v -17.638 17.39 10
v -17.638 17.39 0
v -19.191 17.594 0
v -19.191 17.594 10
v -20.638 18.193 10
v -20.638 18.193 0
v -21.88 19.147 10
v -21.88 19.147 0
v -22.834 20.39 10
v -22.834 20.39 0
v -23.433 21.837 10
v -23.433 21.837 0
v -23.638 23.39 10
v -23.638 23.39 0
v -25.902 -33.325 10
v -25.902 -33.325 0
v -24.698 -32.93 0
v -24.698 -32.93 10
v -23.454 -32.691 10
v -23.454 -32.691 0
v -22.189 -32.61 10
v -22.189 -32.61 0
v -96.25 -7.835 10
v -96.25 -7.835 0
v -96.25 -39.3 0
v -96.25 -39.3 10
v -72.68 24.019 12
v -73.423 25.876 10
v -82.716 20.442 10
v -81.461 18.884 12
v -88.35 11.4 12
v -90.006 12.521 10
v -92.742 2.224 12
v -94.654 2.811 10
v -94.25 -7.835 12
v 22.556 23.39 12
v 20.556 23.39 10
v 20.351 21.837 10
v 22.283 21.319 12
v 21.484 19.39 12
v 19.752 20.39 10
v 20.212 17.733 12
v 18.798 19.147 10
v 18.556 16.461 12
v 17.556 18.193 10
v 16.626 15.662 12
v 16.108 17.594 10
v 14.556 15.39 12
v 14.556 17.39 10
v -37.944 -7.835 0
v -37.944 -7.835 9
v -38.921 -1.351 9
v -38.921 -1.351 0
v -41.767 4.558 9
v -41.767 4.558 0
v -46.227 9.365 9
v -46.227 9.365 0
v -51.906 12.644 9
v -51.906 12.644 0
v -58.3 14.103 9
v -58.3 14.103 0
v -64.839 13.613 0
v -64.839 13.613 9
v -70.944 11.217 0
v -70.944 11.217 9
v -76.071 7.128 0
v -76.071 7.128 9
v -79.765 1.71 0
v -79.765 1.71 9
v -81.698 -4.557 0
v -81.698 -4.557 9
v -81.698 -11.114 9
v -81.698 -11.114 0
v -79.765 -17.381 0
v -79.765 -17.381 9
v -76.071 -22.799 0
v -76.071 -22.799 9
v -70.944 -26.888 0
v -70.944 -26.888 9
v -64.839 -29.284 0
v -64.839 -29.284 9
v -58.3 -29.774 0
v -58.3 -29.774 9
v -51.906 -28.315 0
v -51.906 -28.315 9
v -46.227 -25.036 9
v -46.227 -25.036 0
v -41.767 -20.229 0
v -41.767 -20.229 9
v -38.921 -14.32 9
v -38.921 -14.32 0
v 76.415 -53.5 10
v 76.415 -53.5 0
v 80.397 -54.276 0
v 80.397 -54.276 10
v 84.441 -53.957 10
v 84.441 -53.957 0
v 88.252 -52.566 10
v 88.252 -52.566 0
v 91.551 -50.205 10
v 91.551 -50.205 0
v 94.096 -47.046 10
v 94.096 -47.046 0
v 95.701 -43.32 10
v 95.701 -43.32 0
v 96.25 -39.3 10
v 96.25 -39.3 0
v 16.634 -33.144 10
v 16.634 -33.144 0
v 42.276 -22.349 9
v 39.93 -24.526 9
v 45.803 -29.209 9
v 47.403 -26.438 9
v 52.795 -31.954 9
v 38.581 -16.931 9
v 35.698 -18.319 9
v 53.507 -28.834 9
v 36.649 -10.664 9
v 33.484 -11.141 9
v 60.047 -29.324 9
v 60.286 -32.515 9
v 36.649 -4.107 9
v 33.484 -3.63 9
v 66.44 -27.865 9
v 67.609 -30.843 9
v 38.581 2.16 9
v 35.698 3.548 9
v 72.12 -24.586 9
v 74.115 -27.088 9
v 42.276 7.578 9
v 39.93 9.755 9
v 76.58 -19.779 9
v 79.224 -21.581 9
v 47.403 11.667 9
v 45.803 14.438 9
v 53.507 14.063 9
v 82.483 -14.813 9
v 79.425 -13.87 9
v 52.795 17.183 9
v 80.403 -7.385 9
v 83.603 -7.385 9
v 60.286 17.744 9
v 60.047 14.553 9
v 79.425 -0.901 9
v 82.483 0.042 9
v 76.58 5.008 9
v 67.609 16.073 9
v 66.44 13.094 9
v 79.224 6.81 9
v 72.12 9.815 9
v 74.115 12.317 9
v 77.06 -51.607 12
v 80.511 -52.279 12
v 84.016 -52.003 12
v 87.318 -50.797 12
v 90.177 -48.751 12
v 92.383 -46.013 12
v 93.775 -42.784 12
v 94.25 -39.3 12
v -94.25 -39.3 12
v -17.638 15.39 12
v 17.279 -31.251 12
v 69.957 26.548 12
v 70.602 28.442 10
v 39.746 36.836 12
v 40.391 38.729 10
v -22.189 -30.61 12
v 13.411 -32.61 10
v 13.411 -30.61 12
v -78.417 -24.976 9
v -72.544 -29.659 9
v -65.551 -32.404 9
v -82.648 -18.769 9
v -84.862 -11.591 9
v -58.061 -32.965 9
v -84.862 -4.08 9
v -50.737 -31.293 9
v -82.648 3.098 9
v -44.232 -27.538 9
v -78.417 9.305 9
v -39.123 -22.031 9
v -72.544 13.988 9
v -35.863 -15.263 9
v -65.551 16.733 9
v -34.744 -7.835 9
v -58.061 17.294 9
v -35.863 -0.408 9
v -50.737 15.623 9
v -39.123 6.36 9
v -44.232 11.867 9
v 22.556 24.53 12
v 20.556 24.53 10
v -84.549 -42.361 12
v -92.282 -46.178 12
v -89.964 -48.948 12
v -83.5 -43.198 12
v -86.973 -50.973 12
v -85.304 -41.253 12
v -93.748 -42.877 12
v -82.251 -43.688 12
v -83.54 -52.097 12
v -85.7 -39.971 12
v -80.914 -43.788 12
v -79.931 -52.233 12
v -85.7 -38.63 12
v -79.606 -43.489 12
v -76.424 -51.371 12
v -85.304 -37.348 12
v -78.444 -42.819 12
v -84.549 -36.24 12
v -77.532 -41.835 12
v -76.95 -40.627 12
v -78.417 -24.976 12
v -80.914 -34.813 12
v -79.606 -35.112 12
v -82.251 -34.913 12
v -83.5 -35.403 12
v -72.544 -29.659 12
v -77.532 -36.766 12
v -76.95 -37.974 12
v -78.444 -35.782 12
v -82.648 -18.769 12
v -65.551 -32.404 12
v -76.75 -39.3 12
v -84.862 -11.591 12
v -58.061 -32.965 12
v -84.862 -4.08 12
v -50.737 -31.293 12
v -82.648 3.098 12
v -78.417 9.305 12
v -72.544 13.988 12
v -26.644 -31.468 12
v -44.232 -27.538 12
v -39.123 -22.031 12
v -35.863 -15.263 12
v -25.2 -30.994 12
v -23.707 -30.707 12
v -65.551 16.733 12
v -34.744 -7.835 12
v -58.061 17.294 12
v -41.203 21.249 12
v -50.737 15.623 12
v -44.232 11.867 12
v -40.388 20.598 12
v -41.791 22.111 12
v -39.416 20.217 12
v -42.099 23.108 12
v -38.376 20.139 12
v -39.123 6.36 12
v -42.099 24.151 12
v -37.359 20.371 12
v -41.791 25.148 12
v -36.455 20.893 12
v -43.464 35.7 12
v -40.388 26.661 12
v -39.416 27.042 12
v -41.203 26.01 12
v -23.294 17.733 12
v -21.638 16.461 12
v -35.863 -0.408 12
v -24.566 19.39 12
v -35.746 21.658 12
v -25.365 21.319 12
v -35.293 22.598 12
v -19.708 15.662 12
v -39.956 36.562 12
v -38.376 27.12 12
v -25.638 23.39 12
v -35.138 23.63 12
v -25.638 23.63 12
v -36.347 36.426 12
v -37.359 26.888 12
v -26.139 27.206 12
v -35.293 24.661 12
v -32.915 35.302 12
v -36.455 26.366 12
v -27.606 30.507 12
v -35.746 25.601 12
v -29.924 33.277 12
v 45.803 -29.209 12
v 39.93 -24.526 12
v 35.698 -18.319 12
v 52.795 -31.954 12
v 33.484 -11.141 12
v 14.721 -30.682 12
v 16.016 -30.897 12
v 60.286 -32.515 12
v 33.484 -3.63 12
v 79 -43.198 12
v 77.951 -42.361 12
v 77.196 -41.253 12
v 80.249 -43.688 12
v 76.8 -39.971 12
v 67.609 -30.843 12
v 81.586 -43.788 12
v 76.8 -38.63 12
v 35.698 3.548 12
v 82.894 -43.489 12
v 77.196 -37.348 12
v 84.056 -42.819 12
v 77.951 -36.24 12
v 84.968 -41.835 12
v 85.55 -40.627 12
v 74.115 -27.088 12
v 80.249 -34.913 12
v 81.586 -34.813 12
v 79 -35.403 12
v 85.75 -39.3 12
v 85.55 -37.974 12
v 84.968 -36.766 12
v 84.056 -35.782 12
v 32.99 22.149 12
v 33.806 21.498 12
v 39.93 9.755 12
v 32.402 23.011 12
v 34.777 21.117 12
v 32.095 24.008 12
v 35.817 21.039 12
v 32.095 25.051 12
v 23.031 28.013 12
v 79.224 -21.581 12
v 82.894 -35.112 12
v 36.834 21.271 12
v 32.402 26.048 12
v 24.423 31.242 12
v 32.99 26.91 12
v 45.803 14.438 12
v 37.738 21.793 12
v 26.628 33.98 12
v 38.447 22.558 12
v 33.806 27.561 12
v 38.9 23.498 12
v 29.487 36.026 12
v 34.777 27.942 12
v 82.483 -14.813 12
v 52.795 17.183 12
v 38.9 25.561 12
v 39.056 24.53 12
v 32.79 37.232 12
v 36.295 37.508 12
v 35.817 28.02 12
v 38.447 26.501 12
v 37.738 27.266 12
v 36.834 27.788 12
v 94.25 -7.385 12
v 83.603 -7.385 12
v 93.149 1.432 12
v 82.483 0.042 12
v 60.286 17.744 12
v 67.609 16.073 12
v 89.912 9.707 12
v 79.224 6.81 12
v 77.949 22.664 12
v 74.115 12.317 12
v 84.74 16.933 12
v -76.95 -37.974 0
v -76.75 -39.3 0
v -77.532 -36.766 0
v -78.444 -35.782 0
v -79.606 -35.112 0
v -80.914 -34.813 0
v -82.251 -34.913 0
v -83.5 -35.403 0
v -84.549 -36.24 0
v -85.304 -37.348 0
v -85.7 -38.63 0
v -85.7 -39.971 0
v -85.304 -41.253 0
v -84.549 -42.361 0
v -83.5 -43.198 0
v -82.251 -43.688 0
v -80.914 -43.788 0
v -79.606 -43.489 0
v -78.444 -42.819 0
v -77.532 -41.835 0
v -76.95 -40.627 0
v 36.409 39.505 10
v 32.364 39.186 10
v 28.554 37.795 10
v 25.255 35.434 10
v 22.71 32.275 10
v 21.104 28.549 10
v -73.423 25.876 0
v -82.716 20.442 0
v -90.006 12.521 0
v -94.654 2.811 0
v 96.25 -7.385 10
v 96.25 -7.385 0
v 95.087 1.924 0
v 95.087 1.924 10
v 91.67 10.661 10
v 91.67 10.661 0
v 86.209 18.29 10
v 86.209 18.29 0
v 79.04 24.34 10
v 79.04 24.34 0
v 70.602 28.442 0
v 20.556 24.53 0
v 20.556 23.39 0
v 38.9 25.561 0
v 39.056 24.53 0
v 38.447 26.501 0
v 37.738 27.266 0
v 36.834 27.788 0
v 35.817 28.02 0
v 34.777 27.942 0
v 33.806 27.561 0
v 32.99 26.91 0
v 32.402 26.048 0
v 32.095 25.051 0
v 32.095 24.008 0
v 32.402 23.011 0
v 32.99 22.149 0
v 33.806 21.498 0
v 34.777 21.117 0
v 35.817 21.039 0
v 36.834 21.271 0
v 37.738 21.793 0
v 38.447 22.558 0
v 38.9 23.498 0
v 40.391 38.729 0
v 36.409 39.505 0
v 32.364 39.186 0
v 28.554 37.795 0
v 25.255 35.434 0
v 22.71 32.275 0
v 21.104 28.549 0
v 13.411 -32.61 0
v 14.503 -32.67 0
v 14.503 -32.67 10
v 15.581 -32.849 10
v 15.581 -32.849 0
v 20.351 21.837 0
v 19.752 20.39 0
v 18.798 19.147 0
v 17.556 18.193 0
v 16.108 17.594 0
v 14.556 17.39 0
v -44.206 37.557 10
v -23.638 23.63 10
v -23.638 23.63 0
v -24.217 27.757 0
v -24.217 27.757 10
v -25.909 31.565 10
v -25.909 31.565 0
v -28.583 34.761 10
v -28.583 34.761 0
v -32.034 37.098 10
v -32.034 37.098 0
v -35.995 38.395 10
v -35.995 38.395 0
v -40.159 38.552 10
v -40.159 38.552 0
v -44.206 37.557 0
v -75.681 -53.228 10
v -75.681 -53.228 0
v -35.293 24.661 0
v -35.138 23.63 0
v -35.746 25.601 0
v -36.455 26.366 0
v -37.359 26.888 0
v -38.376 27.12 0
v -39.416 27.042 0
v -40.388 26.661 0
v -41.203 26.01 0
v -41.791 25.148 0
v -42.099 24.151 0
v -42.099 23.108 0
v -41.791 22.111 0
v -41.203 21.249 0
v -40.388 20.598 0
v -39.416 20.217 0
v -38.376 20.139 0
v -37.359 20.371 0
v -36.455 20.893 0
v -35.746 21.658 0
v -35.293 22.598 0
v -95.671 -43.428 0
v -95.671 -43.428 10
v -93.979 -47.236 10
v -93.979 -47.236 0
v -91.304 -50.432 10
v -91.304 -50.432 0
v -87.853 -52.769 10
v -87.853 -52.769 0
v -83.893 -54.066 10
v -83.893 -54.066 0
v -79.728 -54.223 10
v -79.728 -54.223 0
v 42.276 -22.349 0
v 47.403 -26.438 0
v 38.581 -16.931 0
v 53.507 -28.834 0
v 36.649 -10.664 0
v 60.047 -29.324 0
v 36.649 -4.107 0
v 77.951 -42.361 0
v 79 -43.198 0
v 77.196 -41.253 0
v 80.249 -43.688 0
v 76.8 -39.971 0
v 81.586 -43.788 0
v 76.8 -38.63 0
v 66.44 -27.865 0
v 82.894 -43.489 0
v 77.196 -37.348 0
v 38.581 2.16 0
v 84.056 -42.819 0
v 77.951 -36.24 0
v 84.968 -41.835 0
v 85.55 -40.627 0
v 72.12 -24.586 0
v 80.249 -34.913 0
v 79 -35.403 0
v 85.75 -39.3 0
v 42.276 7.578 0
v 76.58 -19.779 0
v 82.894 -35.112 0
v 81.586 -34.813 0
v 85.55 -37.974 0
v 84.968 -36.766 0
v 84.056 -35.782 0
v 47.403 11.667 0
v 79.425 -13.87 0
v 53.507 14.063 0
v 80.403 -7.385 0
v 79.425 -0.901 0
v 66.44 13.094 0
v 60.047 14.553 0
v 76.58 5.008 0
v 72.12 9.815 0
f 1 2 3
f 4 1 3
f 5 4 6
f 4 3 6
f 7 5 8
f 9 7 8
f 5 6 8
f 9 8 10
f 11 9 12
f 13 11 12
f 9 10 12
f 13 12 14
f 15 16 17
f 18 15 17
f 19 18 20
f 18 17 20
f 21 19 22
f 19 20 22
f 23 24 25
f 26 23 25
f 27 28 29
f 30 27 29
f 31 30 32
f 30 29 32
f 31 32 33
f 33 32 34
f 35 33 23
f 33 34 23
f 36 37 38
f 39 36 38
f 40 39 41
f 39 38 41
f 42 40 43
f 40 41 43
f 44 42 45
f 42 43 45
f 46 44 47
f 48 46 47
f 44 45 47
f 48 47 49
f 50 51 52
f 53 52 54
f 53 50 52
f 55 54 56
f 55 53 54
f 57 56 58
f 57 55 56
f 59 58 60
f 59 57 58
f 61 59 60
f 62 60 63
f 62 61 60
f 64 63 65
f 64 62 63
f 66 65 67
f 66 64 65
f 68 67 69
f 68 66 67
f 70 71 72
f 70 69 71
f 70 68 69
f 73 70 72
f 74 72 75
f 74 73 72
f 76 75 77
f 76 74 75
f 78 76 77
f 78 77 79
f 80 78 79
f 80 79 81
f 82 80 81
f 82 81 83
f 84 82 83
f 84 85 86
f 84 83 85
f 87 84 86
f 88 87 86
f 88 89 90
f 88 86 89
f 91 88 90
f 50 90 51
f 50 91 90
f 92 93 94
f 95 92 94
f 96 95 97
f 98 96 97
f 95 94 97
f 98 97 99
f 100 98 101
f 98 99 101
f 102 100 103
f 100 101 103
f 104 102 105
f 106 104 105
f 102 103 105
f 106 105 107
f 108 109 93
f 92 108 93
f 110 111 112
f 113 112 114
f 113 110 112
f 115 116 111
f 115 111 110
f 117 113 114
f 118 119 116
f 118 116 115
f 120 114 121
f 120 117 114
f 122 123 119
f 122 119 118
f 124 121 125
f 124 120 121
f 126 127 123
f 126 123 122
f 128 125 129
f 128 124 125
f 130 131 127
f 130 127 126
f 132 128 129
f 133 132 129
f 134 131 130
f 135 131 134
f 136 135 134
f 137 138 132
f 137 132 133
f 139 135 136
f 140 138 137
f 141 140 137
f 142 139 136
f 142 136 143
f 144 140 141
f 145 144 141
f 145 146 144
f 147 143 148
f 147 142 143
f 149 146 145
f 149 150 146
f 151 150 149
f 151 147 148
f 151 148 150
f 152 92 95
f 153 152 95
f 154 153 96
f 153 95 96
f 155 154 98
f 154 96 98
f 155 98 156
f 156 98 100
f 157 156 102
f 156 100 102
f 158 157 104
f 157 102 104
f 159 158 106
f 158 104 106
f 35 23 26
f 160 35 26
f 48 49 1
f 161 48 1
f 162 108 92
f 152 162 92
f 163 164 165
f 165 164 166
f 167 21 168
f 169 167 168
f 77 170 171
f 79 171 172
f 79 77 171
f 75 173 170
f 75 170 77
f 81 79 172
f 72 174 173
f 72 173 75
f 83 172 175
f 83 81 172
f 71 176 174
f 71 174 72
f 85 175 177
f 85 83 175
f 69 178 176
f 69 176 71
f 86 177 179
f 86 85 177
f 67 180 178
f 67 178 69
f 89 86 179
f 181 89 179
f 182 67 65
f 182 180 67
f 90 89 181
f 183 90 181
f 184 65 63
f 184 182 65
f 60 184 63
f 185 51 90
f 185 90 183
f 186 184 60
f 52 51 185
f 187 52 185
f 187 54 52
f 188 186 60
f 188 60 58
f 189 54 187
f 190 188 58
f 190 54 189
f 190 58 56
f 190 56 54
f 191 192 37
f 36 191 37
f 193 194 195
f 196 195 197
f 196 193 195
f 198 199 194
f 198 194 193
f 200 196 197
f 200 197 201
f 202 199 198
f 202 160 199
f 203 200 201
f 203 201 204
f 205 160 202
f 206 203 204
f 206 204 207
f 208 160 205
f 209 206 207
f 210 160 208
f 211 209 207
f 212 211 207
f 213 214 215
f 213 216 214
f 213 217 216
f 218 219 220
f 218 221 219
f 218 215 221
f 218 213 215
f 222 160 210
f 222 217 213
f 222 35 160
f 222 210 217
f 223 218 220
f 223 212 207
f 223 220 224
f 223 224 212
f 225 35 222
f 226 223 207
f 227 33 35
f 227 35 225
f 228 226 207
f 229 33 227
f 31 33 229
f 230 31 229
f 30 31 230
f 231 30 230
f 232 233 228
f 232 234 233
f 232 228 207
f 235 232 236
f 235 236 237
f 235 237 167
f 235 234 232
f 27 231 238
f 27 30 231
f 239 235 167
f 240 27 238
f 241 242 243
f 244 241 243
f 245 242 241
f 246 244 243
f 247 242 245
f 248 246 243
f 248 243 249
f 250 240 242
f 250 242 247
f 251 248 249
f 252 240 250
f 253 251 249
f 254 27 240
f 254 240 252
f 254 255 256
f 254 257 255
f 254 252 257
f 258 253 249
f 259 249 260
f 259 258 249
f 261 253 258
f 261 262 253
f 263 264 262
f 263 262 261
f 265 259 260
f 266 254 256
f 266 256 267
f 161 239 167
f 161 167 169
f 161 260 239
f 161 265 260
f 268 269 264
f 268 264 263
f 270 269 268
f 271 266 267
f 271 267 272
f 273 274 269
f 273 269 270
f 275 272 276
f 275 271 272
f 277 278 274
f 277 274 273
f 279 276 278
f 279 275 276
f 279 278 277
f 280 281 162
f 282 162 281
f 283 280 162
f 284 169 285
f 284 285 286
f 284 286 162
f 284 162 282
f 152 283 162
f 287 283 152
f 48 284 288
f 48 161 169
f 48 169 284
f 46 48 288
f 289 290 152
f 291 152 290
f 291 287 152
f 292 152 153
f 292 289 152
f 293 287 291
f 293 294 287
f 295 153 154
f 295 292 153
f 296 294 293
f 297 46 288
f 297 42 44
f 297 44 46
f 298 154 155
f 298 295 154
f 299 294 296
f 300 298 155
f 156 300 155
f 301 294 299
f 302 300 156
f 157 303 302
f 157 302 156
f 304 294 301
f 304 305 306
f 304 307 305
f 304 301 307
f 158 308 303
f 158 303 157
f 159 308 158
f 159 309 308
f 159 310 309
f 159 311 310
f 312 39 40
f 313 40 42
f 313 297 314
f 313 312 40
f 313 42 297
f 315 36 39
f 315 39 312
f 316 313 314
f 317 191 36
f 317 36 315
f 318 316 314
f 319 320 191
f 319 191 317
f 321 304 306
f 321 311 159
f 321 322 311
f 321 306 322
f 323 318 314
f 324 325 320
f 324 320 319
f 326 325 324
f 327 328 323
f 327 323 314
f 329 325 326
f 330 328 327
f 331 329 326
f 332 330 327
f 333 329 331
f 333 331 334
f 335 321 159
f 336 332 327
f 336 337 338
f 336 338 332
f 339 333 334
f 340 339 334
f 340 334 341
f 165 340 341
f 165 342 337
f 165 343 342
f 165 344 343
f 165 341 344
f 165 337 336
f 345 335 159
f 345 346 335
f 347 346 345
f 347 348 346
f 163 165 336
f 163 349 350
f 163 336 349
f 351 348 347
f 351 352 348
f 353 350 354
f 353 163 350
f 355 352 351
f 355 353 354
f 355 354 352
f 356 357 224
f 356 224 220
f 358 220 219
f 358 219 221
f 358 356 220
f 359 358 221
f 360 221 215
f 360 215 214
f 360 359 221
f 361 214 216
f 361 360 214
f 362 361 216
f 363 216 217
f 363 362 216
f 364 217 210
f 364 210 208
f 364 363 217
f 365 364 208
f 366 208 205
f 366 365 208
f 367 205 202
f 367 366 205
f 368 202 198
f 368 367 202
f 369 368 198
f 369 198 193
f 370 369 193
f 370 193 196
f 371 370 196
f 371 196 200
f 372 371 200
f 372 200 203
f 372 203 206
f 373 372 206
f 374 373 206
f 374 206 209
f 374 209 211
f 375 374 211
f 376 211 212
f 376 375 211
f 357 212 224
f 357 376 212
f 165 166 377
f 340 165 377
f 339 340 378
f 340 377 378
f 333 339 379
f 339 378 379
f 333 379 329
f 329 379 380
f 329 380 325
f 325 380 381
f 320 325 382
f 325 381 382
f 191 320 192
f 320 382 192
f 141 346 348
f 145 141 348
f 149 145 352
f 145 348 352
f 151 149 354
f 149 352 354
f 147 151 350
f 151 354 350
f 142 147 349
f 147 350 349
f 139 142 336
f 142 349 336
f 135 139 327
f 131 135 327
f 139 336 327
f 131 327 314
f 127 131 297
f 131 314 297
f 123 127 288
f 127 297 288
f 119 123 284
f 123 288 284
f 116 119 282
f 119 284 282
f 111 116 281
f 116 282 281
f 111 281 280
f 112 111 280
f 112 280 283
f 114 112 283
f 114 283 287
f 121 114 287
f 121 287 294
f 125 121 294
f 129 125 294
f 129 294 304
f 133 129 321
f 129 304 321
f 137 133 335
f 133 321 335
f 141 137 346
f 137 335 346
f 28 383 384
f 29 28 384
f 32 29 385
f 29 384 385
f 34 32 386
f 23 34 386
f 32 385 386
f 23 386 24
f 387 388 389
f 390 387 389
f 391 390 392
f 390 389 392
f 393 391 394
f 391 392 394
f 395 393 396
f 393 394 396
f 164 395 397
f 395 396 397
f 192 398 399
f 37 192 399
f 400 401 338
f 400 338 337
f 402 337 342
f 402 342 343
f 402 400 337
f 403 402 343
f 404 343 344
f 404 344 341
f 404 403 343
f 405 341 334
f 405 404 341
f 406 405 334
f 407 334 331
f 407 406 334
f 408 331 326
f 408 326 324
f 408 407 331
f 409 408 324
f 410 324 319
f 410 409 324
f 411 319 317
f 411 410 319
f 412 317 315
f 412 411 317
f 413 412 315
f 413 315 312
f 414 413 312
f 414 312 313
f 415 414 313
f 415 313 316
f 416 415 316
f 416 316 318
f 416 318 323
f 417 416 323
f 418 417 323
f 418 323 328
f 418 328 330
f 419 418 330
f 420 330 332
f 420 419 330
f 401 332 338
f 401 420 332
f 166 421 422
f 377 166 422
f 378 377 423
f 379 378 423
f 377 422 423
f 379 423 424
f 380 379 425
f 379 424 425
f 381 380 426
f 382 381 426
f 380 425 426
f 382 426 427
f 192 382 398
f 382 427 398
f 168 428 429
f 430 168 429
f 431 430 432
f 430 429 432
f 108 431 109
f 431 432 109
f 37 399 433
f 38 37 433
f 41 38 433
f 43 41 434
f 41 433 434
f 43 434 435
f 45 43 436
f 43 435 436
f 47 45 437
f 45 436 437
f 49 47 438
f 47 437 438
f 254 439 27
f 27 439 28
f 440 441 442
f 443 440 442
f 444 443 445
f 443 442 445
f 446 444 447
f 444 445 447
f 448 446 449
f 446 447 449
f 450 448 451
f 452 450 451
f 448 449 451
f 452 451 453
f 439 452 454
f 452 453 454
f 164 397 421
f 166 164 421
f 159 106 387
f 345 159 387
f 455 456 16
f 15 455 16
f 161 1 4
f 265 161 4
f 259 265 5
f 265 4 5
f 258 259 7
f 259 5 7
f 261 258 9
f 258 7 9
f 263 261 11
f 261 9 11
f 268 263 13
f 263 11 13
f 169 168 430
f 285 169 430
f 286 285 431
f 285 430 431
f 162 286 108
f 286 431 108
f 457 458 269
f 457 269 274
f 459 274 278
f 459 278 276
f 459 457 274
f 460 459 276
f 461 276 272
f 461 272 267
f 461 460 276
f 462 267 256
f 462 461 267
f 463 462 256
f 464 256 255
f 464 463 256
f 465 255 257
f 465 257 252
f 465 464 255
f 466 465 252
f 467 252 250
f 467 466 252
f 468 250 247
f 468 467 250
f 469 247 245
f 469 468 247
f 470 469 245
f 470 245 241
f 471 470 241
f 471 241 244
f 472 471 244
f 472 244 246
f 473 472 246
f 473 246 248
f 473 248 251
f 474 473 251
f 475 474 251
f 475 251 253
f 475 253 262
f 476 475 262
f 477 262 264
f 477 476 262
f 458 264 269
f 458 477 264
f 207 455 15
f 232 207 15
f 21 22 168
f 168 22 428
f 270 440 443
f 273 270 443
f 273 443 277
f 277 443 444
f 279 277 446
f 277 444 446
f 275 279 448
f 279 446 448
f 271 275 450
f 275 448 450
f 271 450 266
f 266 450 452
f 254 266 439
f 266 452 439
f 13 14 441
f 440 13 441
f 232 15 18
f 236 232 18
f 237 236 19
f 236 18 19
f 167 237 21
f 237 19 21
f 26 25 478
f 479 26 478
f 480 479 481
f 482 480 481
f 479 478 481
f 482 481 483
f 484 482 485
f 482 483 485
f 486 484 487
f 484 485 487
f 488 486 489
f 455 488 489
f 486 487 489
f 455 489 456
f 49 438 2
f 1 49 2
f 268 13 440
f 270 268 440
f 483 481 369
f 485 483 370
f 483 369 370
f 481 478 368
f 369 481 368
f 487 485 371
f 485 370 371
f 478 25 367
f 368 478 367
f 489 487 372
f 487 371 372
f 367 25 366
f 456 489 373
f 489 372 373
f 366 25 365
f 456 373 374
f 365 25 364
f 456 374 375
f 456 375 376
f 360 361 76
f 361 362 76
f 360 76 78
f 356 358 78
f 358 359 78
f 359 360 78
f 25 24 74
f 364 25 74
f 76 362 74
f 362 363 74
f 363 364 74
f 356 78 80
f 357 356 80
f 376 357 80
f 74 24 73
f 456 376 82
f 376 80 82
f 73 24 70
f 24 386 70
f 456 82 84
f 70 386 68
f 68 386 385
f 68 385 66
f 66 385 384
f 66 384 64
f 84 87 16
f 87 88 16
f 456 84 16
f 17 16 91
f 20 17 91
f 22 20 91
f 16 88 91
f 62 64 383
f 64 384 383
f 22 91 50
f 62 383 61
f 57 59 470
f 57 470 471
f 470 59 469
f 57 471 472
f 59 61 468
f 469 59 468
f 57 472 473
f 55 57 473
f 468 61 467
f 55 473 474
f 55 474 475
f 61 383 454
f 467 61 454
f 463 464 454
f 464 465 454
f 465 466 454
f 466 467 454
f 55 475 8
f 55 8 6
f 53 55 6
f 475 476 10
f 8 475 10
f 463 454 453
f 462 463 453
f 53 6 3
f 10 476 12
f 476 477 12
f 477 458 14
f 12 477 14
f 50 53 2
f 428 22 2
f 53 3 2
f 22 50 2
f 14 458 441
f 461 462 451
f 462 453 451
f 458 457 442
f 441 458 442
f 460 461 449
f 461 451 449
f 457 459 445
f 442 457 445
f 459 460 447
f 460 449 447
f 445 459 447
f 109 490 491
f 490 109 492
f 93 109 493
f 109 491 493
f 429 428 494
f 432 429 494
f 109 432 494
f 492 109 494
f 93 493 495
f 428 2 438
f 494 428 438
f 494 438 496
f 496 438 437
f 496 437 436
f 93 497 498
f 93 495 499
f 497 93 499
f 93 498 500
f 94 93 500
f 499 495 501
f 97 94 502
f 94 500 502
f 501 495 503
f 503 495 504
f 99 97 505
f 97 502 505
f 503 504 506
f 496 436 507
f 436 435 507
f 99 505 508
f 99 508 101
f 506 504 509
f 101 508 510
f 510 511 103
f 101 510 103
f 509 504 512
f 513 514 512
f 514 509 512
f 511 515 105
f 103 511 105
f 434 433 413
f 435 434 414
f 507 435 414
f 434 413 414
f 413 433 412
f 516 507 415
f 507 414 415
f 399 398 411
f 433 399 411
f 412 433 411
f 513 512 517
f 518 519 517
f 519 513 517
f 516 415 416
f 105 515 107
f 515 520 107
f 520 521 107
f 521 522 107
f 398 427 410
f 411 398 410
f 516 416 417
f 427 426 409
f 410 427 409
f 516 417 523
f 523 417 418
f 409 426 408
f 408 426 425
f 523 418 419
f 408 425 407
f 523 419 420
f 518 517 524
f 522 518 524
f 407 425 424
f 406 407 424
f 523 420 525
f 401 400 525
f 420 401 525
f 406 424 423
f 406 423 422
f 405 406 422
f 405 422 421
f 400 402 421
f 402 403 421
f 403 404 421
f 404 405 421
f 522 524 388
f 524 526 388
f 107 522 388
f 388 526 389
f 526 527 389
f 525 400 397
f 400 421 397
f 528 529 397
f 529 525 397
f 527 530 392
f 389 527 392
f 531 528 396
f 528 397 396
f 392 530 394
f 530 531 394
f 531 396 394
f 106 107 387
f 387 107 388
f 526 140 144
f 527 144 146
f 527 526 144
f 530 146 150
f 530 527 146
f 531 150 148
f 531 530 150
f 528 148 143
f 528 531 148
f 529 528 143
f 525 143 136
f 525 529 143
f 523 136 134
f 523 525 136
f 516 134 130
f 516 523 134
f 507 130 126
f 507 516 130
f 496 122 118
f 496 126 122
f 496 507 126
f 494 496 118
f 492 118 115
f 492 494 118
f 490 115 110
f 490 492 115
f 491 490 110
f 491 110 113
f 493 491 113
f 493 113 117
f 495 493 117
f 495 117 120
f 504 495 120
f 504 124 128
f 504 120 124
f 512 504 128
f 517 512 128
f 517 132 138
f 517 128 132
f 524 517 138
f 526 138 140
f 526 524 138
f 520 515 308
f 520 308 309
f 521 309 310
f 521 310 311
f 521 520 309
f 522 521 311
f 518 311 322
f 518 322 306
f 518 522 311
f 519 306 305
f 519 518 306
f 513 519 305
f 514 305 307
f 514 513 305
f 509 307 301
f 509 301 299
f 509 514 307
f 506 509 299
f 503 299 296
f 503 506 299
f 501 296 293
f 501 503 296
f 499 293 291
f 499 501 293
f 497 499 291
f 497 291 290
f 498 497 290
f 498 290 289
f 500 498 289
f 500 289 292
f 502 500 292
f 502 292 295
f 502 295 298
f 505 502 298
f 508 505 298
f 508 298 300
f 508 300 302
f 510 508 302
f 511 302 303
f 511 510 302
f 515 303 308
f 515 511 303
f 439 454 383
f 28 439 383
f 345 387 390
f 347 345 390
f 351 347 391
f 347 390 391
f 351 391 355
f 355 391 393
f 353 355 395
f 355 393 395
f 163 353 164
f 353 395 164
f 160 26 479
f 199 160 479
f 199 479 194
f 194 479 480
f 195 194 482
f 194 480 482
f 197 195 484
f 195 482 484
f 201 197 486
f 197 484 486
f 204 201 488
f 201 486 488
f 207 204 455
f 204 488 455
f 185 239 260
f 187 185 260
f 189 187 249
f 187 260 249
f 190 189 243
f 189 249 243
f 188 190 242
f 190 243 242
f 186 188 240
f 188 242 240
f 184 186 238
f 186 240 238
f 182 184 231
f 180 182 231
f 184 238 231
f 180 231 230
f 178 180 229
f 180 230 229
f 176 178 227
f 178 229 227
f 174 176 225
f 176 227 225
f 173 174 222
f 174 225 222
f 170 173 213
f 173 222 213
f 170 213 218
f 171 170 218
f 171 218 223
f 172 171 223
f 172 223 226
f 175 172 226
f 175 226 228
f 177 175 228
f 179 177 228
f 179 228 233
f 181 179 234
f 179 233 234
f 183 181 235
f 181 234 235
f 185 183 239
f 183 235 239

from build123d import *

# Parameters (mm, degrees)
F0_R     = 4.5
F0_R_2   = 22
F0_R_3   = 3.5
F1_DEPTH = 12
F2_R     = 25.2
F3_DEPTH = 3
F4_SIZE  = 2


# Not quite as in the source:
# - ends of sketch curves that miss each other by under 0.0002 mm in the source are joined


with BuildPart() as f1:
    # F0 (on Top) → F1 (new body)
    with BuildSketch(Plane.XY):
        with BuildLine():
            Line((-96.25, -7.835472), (-96.25, -39.300472))
            ThreePointArc((-96.25, -39.300472), (-89.6603385796, -51.720866719), (-75.6811726698, -53.2284353172))
            Line((-75.6811726698, -53.2284353172), (-25.901923657, -33.3251628629))
            ThreePointArc((-25.901923657, -33.3251628629), (-24.0797305928, -32.7907701516), (-22.189372, -32.610472))
            Line((-22.189372, -32.610472), (13.41096, -32.610472))
            ThreePointArc((13.41096, -32.610472), (15.0445629213, -32.7448072228), (16.6342757601, -33.1442037009))
            Line((16.6342757601, -33.1442037009), (76.4150264593, -53.4998741564))
            ThreePointArc((76.4150264593, -53.4998741564), (89.9814201421, -51.4972872524), (96.25, -39.300472))
            Line((96.25, -39.300472), (96.25, -7.385472))
            ThreePointArc((96.25, -7.385472), (89.1771507076, 14.6451910108), (70.602136617, 28.4417181588))
            Line((70.602136617, 28.4417181588), (40.3905414757, 38.7289301785))
            ThreePointArc((40.3905414757, 38.7289301785), (26.82414783, 36.7263432324), (20.555568, 24.529528))
            Line((20.555568, 24.529528), (20.555568, 23.389528))
            ThreePointArc((20.555568, 23.389528), (18.7982086871, 19.1468873129), (14.555568, 17.389528))
            Line((14.555568, 17.389528), (-17.637618, 17.389528))
            ThreePointArc((-17.637618, 17.389528), (-21.8802586871, 19.1468873129), (-23.637618, 23.389528))
            Line((-23.637618, 23.389528), (-23.637618, 23.629528))
            ThreePointArc((-23.637618, 23.629528), (-30.2272793638, 36.0499226807), (-44.2064452032, 37.557491368))
            Line((-44.2064452032, 37.557491368), (-73.4226694122, 25.875948235))
            ThreePointArc((-73.4226694122, 25.875948235), (-90.0062904382, 12.5210187268), (-96.25, -7.835472))
        make_face()
        with Locations((-81.25, -39.300472)):
            Circle(F0_R, mode=Mode.SUBTRACT)
        with Locations((-59.943809, -7.835472)):
            Circle(F0_R_2, mode=Mode.SUBTRACT)
        with Locations((81.25, -39.300472)):
            Circle(F0_R, mode=Mode.SUBTRACT)
        with Locations((-38.637618, 23.629528)):
            Circle(F0_R_3, mode=Mode.SUBTRACT)
        with Locations((58.402784, -7.385472)):
            Circle(F0_R_2, mode=Mode.SUBTRACT)
        with Locations((35.555568, 24.529528)):
            Circle(F0_R_3, mode=Mode.SUBTRACT)
    extrude(amount=F1_DEPTH)

    # F2 (on face) → F3 (cut)
    with BuildSketch(Plane.XY.offset(12)):
        with Locations((-59.943809, -7.835472)):
            Circle(F2_R)
        with Locations((58.402784, -7.385472)):
            Circle(F2_R)
    extrude(amount=-F3_DEPTH, mode=Mode.SUBTRACT)

    # F4
    f4_edges = [f1.edges().sort_by_distance(p)[0] for p in [
        (-58.814557, 31.71672, 12),
    ]]
    chamfer(f4_edges, length=F4_SIZE)


solid = f1.part
